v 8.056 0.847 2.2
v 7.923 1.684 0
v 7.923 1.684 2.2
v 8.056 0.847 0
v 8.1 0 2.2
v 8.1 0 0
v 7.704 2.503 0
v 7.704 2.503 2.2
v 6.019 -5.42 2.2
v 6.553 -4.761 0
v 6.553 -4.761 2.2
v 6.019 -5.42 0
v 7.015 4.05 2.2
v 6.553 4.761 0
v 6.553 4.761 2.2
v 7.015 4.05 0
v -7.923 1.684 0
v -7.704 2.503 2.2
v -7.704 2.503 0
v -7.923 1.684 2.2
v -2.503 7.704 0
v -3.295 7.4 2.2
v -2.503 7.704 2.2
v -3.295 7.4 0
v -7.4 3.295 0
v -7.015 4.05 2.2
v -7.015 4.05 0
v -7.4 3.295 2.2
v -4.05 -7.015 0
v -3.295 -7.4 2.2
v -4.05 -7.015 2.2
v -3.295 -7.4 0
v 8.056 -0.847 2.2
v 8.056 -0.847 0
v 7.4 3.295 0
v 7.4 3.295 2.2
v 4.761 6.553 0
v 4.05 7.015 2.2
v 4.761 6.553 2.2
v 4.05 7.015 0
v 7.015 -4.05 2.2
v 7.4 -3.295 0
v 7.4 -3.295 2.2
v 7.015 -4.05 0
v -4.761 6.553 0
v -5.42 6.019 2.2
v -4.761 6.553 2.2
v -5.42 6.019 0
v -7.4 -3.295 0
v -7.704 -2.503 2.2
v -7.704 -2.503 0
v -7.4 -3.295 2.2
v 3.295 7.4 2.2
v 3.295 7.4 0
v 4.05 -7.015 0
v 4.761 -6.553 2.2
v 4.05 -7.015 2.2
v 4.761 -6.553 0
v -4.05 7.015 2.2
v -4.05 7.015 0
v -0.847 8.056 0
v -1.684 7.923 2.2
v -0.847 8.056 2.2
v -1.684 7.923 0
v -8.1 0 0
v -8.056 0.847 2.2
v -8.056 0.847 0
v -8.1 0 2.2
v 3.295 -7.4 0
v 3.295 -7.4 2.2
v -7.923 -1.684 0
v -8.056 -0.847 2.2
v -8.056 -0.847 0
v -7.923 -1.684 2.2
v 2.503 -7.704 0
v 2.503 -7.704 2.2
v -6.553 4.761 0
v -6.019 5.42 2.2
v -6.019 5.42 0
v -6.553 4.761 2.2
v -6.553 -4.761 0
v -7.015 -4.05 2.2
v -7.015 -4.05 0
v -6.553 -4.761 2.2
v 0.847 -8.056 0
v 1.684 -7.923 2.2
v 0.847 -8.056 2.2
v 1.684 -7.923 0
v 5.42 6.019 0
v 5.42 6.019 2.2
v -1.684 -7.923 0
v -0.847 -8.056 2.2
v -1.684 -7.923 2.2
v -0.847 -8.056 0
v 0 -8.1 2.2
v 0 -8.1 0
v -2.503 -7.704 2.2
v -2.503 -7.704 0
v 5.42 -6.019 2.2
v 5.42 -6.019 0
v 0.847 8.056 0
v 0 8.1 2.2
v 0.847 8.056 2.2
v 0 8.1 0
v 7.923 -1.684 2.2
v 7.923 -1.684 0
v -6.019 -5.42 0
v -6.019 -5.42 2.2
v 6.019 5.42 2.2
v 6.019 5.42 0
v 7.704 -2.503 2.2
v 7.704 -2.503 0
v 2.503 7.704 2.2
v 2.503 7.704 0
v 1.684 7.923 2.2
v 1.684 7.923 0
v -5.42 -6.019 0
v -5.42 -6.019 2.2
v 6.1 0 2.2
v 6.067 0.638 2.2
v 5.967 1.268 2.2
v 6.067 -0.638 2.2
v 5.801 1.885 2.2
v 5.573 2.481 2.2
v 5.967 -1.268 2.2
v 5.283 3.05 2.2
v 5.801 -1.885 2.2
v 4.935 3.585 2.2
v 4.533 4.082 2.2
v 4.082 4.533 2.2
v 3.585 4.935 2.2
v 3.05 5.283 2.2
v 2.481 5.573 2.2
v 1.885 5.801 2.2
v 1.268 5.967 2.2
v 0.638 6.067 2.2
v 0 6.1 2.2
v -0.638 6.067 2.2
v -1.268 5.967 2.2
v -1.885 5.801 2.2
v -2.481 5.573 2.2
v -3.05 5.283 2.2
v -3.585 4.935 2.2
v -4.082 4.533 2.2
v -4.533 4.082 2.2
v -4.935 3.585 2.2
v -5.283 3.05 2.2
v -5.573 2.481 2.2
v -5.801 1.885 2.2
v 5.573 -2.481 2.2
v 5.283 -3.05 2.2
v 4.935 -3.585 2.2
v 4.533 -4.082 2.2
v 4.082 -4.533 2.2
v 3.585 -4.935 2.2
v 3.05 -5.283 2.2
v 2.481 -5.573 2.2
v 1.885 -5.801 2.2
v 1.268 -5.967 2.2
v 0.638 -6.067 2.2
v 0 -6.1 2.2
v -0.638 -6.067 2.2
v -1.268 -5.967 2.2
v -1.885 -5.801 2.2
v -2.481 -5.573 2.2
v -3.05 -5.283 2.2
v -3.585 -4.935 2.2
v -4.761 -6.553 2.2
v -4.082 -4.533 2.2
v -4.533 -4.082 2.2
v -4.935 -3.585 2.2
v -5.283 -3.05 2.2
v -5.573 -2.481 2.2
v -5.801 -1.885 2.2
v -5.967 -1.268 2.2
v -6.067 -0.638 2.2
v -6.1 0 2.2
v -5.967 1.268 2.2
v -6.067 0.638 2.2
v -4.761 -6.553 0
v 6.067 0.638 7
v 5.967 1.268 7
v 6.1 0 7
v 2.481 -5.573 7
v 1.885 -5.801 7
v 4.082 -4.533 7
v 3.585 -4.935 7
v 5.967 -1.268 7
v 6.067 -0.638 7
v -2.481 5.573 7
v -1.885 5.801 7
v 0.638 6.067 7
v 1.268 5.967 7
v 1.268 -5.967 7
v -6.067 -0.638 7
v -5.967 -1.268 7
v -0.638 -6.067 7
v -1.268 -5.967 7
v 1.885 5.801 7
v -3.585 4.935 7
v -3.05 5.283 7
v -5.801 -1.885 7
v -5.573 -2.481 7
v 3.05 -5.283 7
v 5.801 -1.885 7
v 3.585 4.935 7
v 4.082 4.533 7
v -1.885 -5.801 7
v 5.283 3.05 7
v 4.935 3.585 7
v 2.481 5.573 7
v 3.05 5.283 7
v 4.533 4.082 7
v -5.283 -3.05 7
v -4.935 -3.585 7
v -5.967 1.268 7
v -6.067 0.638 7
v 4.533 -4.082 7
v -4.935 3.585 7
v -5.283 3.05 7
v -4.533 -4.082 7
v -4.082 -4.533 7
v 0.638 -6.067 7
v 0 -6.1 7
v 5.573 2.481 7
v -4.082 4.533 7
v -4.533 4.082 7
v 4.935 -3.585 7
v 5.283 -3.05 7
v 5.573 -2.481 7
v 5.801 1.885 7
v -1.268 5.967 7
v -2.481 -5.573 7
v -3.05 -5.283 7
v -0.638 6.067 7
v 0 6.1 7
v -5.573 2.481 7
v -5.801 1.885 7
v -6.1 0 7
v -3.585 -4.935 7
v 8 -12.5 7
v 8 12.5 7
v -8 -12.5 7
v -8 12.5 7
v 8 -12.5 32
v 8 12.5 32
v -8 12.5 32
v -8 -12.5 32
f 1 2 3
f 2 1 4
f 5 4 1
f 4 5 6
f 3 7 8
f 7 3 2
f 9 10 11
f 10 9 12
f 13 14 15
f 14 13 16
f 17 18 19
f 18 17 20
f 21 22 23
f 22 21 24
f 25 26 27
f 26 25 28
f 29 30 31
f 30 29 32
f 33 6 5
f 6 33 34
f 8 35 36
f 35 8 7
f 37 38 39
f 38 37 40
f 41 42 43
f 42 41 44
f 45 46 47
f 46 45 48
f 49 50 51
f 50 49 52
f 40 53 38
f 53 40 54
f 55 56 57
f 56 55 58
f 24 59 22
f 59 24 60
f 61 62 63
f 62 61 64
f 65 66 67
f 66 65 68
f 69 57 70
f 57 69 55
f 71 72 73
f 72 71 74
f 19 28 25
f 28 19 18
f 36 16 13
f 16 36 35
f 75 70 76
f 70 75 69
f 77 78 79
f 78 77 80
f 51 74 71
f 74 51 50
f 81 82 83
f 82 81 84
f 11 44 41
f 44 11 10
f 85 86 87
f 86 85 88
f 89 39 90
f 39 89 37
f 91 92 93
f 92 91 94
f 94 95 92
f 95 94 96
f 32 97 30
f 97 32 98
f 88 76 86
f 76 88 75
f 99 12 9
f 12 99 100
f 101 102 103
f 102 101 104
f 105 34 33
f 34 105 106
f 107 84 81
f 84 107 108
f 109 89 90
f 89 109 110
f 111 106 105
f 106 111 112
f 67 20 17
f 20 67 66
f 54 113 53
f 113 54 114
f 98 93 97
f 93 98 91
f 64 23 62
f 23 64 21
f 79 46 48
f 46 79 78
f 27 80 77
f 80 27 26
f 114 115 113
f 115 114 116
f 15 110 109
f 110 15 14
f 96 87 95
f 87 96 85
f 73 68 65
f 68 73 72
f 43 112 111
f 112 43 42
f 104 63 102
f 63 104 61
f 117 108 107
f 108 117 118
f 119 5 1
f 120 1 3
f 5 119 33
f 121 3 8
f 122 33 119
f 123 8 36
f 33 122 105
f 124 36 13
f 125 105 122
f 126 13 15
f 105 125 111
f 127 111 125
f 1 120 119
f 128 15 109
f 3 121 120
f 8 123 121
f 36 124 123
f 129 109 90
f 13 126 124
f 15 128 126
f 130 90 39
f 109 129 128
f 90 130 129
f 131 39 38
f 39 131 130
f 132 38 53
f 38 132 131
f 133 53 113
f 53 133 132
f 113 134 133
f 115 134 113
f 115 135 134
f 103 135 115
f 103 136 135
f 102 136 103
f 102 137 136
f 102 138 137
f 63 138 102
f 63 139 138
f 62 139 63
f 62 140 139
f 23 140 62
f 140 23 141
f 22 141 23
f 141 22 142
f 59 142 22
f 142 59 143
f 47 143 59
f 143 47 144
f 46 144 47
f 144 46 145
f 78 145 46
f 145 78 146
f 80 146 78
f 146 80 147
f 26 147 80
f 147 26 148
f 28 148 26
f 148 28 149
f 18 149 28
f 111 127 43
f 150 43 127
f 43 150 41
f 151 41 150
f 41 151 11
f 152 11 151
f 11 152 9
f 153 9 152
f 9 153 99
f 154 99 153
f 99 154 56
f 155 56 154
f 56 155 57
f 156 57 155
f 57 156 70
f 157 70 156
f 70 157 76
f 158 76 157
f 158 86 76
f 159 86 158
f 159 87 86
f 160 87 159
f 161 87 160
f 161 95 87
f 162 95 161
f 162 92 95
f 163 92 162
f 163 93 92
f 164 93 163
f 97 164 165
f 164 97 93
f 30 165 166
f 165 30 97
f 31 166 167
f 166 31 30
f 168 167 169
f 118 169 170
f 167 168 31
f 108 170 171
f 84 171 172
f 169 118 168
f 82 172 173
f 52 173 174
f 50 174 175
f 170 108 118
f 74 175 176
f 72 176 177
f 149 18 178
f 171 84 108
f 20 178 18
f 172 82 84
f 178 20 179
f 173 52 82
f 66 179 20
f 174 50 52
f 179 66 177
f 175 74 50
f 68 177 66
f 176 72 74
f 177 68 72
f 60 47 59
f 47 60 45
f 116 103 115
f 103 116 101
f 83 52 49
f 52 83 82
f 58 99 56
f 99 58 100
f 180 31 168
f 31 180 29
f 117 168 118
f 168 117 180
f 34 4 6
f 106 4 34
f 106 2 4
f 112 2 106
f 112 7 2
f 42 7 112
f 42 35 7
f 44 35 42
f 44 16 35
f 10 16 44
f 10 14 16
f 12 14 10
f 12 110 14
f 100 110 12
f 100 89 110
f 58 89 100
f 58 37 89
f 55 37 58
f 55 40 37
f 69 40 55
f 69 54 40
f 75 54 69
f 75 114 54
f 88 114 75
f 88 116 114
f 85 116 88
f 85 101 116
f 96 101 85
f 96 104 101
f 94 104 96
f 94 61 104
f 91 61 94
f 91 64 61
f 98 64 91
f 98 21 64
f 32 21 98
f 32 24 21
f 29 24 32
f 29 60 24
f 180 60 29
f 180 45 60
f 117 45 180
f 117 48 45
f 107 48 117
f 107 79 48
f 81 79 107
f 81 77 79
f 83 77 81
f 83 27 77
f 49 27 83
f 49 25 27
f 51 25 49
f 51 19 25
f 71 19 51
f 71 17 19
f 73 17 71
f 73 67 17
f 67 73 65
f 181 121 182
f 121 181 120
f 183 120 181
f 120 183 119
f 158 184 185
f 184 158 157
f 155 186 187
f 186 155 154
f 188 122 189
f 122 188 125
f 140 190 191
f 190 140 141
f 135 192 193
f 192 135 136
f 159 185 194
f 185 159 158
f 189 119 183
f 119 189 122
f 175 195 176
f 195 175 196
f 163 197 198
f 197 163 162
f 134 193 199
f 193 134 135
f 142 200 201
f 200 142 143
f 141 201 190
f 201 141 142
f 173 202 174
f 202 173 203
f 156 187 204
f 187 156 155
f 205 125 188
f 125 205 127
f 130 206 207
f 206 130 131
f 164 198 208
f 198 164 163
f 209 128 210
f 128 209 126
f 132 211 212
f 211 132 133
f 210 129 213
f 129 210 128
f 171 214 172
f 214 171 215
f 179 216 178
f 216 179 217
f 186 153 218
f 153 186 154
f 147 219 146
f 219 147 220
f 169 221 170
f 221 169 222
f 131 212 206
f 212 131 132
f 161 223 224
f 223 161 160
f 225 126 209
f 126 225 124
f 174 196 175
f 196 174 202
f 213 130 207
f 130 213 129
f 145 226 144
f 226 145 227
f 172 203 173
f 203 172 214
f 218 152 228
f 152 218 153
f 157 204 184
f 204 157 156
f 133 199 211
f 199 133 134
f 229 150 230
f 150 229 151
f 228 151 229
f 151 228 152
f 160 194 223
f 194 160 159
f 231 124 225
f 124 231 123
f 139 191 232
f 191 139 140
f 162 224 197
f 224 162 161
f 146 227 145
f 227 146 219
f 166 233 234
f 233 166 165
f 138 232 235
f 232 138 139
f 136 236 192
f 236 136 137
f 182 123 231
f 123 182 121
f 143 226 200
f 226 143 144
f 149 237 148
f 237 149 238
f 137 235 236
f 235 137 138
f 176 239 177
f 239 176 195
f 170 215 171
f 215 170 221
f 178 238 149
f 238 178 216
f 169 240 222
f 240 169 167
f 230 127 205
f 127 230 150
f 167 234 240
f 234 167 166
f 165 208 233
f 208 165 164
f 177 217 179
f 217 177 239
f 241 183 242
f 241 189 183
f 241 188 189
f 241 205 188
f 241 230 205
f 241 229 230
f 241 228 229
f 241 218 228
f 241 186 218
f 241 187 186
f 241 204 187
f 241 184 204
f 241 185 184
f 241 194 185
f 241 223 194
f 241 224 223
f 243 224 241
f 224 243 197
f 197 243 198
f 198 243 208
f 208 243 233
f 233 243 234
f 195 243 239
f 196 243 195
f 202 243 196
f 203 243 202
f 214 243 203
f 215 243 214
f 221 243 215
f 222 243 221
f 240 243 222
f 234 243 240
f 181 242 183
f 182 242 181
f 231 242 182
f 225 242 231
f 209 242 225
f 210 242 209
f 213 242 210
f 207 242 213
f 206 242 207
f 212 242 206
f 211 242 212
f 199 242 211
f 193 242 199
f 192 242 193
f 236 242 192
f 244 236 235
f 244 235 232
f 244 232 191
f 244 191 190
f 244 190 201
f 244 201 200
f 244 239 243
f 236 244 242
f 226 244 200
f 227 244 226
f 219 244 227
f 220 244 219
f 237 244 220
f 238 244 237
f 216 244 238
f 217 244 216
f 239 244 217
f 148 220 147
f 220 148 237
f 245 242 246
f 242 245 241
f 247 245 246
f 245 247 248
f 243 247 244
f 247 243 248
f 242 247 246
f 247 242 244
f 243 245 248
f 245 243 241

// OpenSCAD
// file: slot_fill.scad
module slot_fill(length = 20) {
  difference() {
    translate([0, 0, 0]) rotate([0, 0, 0]) cylinder(r=4.5, h=length, center=true,  $fn=4);	
    //plane sides
	translate([-3.8, 0, 0]) rotate([0, 0, 0]) cube([4, 20, length*2], center=true);
	translate([3, 0, 0]) rotate([0, 0, 0]) cube([6, 20, length*2], center=true);
  }
}
// main file
include <MCAD/shapes.scad>
include <slot_fill.scad>


module fhex(wid,height){
  hull(){
    cube([wid/1.7,wid,height],center=true);
    rotate([0,0,120]) cube([wid/1.7,wid,height], center=true);
    rotate([0,0,240]) cube([wid/1.7,wid,height], center=true);
  }
}

module dyze_mount(fudge=0.2){
  translate([0,0,(2+fudge)/2]) cylinder(d=16+fudge, h=2+fudge, $fn=60, center=true);
  translate([0,0,(2+fudge)+((5-fudge)/2)]) cylinder(d=12+fudge, h=5-fudge, $fn=60, center=true);
  translate([0,0,7+25/2]) cube([16,25,25], center=true);
}


dyze_mount();
